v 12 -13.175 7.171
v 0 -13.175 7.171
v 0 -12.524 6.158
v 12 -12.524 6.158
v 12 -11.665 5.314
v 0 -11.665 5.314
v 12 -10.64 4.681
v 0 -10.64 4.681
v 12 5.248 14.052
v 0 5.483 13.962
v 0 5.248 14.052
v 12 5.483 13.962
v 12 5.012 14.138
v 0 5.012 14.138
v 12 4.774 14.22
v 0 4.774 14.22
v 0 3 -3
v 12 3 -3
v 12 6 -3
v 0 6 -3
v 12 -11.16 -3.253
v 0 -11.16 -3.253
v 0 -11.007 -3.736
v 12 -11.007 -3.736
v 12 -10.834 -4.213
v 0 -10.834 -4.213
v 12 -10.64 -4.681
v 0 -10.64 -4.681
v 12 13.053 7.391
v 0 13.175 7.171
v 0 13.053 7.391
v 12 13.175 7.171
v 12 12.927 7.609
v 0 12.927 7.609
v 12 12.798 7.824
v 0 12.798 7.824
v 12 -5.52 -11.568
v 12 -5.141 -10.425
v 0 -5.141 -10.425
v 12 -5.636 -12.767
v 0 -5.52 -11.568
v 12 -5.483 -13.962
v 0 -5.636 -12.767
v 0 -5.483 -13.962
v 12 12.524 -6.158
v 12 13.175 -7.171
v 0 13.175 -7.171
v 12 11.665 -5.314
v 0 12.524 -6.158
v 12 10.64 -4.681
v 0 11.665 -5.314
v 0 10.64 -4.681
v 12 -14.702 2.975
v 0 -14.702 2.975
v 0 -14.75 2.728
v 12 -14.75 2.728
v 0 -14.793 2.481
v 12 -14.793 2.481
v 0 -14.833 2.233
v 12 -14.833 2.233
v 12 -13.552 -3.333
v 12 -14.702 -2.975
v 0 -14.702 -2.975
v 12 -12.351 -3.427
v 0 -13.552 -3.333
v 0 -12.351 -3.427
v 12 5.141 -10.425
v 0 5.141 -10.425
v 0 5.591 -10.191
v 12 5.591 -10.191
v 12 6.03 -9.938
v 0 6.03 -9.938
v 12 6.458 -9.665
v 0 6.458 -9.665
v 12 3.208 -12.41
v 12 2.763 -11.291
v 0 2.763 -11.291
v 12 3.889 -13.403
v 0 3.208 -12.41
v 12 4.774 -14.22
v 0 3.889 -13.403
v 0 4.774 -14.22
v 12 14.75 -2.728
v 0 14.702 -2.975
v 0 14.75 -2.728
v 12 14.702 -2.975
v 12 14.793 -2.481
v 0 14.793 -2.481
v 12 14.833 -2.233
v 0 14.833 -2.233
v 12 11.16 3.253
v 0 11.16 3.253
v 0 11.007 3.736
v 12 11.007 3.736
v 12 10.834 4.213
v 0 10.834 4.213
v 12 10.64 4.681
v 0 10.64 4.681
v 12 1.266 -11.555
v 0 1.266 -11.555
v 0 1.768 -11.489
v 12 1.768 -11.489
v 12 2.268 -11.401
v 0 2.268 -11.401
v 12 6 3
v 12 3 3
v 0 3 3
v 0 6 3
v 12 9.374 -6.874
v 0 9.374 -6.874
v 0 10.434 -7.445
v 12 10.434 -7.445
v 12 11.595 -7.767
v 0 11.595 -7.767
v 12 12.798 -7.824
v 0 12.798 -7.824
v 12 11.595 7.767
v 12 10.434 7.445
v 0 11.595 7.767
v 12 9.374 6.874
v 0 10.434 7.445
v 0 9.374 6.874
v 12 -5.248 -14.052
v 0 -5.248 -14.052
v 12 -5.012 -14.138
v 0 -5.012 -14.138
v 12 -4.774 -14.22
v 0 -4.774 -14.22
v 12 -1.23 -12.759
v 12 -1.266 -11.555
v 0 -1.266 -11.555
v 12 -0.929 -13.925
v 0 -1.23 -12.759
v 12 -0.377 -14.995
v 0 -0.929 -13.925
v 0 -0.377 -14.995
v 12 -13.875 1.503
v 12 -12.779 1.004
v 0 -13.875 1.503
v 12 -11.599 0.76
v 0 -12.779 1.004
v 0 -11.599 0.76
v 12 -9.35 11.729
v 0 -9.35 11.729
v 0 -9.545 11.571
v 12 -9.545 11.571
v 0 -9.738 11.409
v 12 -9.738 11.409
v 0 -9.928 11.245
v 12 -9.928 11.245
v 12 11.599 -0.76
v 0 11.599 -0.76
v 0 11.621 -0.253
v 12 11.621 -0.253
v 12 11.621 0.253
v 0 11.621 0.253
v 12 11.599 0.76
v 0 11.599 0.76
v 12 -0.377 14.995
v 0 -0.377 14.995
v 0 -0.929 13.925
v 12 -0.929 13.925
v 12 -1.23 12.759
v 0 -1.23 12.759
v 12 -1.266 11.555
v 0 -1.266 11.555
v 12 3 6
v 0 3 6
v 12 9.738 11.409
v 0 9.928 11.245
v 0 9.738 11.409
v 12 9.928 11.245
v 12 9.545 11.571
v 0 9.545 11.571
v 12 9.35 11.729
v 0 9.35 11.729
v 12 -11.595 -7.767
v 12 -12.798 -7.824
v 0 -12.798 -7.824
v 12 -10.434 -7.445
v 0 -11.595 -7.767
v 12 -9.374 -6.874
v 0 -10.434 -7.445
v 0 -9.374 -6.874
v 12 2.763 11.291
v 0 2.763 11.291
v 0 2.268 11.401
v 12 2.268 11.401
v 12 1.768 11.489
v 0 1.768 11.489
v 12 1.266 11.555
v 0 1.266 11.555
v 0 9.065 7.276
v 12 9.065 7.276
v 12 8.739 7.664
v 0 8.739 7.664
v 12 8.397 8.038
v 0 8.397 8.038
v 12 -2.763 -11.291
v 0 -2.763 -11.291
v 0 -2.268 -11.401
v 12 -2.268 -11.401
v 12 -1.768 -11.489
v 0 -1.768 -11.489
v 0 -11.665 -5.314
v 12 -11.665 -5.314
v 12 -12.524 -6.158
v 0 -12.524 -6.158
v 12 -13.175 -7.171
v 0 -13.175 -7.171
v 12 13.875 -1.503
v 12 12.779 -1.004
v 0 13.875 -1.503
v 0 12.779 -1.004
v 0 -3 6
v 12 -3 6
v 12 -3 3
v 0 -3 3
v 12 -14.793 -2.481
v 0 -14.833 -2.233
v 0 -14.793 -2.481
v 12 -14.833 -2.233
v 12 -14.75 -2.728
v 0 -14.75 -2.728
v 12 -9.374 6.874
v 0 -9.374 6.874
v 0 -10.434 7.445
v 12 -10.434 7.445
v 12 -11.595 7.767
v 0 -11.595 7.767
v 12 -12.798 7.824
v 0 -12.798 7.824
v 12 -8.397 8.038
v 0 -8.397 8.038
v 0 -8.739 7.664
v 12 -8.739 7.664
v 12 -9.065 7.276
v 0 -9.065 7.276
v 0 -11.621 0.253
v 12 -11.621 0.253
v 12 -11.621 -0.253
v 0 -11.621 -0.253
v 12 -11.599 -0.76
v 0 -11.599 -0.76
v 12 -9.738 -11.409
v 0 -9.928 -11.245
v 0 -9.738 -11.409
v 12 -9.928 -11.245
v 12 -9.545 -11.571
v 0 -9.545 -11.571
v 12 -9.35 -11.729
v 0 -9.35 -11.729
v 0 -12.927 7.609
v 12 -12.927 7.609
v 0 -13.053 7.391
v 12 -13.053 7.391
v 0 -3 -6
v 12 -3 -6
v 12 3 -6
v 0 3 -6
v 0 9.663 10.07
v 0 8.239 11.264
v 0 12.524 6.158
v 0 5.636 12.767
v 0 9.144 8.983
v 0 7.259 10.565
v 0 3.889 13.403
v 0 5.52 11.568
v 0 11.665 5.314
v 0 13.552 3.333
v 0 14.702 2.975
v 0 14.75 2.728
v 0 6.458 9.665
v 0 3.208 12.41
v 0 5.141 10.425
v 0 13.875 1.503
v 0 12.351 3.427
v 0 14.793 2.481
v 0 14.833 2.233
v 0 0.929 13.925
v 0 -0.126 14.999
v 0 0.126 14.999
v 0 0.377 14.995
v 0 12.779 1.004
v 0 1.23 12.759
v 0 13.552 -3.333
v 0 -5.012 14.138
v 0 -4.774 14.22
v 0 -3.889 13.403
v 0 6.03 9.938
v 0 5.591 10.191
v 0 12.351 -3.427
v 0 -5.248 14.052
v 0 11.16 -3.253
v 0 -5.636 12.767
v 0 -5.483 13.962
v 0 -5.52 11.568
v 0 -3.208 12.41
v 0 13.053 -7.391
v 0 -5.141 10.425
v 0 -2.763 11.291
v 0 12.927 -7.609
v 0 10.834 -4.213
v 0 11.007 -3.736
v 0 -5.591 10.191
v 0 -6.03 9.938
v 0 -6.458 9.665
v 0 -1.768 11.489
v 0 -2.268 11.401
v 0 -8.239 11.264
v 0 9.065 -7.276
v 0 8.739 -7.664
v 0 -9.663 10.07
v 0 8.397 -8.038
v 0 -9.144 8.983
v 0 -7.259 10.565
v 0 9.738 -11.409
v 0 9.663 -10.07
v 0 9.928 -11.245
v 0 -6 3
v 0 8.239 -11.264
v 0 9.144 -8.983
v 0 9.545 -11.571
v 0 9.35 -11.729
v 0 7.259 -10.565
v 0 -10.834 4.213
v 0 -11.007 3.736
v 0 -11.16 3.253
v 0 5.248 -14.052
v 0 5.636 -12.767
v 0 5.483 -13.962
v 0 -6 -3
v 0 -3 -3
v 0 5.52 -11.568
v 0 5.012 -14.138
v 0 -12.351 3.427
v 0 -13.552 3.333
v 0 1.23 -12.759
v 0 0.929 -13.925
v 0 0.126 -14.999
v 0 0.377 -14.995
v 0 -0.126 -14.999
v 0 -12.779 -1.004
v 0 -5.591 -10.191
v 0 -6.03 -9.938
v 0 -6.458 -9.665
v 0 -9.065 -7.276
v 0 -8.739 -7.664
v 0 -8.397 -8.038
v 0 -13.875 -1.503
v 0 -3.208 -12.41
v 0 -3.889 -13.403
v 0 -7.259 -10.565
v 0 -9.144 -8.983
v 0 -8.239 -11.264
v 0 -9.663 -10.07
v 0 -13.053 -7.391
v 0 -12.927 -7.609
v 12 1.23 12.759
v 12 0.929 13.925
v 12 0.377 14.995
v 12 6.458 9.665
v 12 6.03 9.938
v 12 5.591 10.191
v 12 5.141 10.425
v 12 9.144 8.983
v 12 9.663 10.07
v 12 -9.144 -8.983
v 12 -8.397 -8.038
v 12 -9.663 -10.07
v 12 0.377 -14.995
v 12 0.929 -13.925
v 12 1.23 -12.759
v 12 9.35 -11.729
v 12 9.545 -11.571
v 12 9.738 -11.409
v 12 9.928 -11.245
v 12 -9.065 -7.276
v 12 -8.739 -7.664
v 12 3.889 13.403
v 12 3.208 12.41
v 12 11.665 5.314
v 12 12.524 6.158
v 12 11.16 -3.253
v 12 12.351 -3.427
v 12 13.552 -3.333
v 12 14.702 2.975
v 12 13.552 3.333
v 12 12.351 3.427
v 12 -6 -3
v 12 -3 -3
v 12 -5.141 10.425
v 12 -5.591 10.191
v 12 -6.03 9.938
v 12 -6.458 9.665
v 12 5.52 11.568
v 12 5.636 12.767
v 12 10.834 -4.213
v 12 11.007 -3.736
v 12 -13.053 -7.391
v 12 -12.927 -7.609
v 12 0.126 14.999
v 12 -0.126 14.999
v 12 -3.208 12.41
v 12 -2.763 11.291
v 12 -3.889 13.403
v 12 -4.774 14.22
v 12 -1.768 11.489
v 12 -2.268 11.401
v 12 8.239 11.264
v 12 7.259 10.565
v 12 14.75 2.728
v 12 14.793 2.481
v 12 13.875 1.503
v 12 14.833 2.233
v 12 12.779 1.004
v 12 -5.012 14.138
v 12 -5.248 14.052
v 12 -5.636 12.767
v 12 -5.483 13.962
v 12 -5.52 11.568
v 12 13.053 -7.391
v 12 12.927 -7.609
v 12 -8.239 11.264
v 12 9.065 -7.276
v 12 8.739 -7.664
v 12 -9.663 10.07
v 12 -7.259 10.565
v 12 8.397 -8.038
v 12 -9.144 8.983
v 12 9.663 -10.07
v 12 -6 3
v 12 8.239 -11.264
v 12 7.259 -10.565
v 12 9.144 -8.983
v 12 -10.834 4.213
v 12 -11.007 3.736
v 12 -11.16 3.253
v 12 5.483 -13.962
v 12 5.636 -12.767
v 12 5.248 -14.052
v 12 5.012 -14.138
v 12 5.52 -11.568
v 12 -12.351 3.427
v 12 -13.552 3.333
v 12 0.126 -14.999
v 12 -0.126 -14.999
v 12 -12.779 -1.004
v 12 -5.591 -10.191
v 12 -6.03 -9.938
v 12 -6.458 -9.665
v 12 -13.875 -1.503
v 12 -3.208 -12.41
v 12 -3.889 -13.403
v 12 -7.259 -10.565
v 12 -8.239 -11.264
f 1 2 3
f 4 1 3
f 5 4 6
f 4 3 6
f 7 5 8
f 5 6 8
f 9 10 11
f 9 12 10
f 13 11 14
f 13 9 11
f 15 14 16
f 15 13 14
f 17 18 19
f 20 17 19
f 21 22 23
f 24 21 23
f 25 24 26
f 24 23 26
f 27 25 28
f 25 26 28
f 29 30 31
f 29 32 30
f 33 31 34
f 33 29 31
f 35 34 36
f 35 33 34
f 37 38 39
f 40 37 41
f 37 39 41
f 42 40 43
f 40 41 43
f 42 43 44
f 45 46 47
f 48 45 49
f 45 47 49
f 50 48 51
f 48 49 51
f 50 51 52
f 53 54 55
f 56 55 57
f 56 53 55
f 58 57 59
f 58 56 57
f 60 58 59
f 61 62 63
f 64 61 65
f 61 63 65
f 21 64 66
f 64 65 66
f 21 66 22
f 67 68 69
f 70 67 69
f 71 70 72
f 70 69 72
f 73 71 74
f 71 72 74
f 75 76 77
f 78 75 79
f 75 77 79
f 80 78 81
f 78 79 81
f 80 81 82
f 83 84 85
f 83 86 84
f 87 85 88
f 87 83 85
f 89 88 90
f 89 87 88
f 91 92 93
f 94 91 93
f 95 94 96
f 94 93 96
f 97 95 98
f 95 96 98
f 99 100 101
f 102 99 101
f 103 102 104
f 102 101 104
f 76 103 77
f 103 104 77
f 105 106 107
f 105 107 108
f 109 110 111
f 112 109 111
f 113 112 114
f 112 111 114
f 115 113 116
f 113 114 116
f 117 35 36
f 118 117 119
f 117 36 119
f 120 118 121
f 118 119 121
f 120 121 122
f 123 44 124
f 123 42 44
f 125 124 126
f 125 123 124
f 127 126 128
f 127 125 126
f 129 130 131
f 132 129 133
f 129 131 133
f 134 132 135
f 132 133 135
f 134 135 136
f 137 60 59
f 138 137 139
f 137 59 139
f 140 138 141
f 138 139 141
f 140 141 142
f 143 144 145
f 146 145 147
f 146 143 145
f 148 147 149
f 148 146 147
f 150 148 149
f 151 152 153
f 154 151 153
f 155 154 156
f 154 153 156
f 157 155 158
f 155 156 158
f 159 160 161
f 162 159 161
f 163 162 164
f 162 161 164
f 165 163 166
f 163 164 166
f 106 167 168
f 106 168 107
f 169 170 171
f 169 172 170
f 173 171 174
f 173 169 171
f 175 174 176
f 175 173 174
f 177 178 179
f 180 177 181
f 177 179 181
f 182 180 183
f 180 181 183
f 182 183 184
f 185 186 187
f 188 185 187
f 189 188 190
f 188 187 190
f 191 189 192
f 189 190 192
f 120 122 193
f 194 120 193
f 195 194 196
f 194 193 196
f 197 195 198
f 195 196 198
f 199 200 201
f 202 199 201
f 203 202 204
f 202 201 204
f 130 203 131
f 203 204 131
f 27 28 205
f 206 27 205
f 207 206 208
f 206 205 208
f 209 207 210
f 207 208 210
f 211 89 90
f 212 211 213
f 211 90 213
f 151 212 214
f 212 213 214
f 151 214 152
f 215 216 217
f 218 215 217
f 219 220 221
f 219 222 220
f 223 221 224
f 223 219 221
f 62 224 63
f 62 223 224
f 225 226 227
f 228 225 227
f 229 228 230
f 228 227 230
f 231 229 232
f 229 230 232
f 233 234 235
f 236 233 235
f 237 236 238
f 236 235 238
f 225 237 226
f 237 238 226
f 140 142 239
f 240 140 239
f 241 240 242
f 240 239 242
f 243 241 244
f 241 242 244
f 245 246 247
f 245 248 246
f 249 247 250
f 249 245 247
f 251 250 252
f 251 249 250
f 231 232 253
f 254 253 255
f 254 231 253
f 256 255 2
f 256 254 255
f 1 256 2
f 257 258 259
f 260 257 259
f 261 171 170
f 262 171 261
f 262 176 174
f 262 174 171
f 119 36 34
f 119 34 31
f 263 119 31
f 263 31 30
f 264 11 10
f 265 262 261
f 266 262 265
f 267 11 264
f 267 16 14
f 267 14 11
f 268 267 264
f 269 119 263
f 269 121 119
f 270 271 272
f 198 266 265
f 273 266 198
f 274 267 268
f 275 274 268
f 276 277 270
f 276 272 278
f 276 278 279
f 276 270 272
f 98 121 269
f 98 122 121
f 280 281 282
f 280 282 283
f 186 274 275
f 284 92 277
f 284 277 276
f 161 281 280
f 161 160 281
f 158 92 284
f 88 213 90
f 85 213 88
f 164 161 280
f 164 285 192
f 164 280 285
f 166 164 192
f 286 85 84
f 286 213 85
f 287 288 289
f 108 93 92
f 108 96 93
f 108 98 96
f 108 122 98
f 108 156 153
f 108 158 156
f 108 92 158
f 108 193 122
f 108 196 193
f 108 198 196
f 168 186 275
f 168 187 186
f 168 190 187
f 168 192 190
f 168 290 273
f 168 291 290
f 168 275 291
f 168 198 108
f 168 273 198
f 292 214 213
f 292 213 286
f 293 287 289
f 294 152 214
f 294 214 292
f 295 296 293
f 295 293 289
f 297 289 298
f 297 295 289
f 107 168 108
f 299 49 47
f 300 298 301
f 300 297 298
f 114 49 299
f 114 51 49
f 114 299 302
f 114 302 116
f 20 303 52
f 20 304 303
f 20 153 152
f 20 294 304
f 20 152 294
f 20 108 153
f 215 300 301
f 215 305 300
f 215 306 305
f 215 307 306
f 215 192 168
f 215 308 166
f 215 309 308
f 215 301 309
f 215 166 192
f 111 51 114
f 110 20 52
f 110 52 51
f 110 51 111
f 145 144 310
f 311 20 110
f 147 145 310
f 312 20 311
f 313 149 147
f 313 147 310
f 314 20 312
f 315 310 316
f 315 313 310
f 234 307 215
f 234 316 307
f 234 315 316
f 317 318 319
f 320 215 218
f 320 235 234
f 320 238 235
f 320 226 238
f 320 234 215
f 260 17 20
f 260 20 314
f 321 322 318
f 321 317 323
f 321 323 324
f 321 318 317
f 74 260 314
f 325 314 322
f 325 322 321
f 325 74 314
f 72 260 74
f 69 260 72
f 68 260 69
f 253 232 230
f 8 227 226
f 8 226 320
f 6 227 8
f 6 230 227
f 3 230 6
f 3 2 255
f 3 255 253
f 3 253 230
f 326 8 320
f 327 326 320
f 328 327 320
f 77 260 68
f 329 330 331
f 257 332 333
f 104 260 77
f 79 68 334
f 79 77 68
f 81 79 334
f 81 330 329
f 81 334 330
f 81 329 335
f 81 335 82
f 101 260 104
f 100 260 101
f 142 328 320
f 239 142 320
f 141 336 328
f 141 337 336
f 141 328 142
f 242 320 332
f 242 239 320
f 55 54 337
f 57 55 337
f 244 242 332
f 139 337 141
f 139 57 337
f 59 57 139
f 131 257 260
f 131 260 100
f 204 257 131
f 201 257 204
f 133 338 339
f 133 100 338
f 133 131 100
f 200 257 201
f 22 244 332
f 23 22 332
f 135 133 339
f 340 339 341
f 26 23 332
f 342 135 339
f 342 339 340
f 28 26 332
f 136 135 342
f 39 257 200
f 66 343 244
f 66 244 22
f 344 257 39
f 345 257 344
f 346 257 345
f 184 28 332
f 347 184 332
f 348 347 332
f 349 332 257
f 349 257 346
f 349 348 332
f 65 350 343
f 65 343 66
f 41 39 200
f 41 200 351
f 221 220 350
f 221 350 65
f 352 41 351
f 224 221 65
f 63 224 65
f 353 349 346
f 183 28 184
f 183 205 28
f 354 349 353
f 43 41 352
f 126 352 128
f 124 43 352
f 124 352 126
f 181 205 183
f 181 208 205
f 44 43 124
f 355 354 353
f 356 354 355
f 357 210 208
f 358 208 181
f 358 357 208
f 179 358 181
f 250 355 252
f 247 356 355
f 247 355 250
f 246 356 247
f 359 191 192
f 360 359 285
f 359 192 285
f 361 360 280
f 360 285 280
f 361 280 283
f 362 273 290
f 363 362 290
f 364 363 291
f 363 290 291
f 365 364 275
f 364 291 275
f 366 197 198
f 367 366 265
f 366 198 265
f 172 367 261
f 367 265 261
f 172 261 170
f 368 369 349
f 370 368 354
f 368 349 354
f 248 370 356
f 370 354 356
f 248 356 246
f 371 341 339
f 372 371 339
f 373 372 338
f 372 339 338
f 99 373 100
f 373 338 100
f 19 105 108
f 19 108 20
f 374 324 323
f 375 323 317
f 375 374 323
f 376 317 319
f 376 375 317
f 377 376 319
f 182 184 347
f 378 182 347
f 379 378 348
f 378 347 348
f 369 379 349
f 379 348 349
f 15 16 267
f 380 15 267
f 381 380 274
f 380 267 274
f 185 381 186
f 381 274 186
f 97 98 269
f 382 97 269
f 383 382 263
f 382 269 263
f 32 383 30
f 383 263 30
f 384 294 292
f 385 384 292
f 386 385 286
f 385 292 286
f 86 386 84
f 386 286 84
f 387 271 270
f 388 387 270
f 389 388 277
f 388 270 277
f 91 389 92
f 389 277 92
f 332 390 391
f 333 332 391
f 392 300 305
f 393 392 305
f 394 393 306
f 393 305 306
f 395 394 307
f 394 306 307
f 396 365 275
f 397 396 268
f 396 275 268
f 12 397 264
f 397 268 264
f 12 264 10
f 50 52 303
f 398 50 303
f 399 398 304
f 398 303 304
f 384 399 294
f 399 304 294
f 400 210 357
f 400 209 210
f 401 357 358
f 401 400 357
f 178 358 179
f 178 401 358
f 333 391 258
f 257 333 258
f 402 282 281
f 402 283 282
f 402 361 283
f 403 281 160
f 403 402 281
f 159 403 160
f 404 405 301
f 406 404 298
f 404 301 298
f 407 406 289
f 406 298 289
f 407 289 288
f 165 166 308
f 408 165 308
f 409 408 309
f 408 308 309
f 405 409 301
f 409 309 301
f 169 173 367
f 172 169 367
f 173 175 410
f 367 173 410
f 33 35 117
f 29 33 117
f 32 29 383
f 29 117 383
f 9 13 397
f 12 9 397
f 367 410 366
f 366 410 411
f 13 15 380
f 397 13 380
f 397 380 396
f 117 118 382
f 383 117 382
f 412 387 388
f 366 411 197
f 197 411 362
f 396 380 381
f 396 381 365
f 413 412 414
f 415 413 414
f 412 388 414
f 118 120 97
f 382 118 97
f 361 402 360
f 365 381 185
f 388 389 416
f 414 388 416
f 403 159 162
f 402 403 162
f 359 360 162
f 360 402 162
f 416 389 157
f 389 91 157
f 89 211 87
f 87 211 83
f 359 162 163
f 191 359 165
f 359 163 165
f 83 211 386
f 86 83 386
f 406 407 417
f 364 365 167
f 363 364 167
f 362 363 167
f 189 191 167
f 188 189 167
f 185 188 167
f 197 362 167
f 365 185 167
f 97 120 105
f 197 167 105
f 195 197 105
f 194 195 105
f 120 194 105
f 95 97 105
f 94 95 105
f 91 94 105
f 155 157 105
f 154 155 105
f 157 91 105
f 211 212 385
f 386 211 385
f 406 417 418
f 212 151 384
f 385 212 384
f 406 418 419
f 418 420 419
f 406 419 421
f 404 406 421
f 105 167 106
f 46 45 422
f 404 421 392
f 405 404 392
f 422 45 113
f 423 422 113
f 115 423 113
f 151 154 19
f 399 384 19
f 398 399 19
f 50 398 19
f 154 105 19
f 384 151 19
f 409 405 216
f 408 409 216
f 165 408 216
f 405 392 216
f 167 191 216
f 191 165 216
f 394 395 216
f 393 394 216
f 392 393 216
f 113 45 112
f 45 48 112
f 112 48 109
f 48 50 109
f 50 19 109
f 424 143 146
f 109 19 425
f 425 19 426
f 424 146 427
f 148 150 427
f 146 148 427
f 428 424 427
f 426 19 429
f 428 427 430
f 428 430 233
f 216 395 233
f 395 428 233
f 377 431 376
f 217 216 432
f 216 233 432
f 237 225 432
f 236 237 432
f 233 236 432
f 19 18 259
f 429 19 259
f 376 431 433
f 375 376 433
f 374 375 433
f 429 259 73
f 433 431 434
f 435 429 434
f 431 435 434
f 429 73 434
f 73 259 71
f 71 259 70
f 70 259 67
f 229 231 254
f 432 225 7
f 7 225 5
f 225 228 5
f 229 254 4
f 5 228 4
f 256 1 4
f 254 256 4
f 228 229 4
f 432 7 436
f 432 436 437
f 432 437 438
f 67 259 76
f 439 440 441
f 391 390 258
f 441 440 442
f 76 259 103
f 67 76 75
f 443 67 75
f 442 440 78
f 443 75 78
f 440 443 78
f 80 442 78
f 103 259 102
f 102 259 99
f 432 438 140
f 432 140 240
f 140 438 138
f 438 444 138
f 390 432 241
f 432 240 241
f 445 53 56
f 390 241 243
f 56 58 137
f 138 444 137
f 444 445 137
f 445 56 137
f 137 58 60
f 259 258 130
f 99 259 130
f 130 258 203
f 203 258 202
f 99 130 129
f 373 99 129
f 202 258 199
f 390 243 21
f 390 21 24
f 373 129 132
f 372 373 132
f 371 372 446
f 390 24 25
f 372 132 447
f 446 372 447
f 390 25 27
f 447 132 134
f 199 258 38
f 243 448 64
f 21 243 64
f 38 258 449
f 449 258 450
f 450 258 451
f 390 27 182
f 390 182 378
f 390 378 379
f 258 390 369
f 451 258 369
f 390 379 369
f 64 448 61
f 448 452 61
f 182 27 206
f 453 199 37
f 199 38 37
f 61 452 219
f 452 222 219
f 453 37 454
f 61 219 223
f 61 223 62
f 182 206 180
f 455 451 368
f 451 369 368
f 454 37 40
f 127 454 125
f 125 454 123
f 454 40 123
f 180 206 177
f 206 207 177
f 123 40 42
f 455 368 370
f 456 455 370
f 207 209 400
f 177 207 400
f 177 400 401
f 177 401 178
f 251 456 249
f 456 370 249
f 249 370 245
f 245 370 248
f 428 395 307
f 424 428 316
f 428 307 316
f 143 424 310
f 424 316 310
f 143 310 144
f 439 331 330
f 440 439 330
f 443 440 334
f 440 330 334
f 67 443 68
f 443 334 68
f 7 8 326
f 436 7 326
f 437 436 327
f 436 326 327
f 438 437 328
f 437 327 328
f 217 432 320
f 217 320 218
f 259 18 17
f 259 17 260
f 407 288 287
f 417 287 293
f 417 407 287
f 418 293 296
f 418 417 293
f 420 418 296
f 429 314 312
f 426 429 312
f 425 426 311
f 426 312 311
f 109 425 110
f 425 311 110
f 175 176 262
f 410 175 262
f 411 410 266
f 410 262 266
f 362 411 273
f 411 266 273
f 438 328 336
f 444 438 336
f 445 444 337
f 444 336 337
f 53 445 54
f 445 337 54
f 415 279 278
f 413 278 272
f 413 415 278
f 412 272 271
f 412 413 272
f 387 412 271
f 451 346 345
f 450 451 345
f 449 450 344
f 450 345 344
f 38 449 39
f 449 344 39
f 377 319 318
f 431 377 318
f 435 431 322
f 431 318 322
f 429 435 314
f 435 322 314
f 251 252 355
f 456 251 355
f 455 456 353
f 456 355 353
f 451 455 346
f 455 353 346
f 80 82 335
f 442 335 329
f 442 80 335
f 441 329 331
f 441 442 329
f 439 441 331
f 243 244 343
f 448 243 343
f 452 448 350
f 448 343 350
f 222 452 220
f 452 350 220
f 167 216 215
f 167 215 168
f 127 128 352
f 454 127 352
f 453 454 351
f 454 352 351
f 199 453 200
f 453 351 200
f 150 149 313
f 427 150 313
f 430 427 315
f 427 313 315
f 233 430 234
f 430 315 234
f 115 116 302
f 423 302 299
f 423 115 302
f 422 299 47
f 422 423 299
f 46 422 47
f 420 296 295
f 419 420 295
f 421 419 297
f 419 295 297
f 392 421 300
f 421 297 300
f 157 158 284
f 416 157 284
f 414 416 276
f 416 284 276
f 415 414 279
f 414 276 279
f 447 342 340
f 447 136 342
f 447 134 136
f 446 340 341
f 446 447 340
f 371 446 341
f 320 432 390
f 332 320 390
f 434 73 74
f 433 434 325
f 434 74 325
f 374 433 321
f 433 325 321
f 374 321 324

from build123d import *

# Parameters (mm, degrees)
BASPROSKE_W        = 12
BASPROSKE_H        = 15
TOOTHCUT_DEPTH     = 25.372115214
TEETHCUTS_COUNT    = 18
TEETHCUTS_ANGLE    = 340
BORSKE_R           = 2
BORE_DEPTH         = 50.0000508
SKETCH2_W          = 3
SKETCH2_H          = 6
SKETCH2_W_2        = 6
SKETCH2_H_2        = 3
CUT_EXTRUDE2_DEPTH = 16


with BuildPart() as part:
    # BasProSke → Base-Revolve (revolve)
    with BuildSketch(Plane(origin=(0, 0, 0), x_dir=(1, 0, 0), z_dir=(0, 1, 0)), mode=Mode.PRIVATE) as base_revolve_sk:
        with Locations((6, 7.5)):
            Rectangle(BASPROSKE_W, BASPROSKE_H)
    revolve(base_revolve_sk.sketch.rotate(Axis((-10, 0, 0), (1, 0, 0)), 180), axis=Axis((-10, 0, 0), (1, 0, 0)))

    # TooCutSke → ToothCut (cut, through all)
    with BuildSketch(Plane(origin=(0, 0, 0), x_dir=(0, 0, -1), z_dir=(1, 0, 0))):
        with BuildLine():
            ThreePointArc((0.759974923, 11.599129886), (0, 11.624), (-0.759974923, 11.599129886))
            ThreePointArc((-0.759974923, 11.599129886), (-1.229186471, 13.354767823), (-2.254227748, 14.855339189))
            ThreePointArc((-2.254227748, 14.855339189), (0, 15.0254), (2.254227748, 14.855339189))
            ThreePointArc((2.254227748, 14.855339189), (1.229186471, 13.354767823), (0.759974923, 11.599129886))
        make_face()
    toothcut = extrude(amount=TOOTHCUT_DEPTH, mode=Mode.SUBTRACT)

    # TeethCuts: ToothCut ×18 about axis
    teethcuts_axis = Axis((-10, 0, 0), (1, 0, 0))
    for i in range(1, TEETHCUTS_COUNT):
        add(toothcut.rotate(teethcuts_axis, i * TEETHCUTS_ANGLE / (TEETHCUTS_COUNT - 1)), mode=Mode.SUBTRACT)

    # BorSke → Bore (cut, symmetric)
    with BuildSketch(Plane(origin=(0, 0, 0), x_dir=(0, 0, -1), z_dir=(1, 0, 0))):
        with Locations(Location((0, 0, 0), (0, 0, 180))):
            Circle(BORSKE_R)
    extrude(amount=BORE_DEPTH, both=True, mode=Mode.SUBTRACT)

    # Sketch2 → Cut-Extrude2 (cut)
    with BuildSketch(Plane(origin=(12, 0, 0), x_dir=(0, 0, -1), z_dir=(1, 0, 0))):
        with Locations((-4.5, 0)):
            Rectangle(SKETCH2_W, SKETCH2_H)
        with Locations((0, 4.5)):
            Rectangle(SKETCH2_W_2, SKETCH2_H_2)
        Rectangle(SKETCH2_W_2, SKETCH2_H)
        with Locations((4.5, 0)):
            Rectangle(SKETCH2_W, SKETCH2_H)
        with Locations((0, -4.5)):
            Rectangle(SKETCH2_W_2, SKETCH2_H_2)
    extrude(amount=-CUT_EXTRUDE2_DEPTH, mode=Mode.SUBTRACT)


solid = part.part
